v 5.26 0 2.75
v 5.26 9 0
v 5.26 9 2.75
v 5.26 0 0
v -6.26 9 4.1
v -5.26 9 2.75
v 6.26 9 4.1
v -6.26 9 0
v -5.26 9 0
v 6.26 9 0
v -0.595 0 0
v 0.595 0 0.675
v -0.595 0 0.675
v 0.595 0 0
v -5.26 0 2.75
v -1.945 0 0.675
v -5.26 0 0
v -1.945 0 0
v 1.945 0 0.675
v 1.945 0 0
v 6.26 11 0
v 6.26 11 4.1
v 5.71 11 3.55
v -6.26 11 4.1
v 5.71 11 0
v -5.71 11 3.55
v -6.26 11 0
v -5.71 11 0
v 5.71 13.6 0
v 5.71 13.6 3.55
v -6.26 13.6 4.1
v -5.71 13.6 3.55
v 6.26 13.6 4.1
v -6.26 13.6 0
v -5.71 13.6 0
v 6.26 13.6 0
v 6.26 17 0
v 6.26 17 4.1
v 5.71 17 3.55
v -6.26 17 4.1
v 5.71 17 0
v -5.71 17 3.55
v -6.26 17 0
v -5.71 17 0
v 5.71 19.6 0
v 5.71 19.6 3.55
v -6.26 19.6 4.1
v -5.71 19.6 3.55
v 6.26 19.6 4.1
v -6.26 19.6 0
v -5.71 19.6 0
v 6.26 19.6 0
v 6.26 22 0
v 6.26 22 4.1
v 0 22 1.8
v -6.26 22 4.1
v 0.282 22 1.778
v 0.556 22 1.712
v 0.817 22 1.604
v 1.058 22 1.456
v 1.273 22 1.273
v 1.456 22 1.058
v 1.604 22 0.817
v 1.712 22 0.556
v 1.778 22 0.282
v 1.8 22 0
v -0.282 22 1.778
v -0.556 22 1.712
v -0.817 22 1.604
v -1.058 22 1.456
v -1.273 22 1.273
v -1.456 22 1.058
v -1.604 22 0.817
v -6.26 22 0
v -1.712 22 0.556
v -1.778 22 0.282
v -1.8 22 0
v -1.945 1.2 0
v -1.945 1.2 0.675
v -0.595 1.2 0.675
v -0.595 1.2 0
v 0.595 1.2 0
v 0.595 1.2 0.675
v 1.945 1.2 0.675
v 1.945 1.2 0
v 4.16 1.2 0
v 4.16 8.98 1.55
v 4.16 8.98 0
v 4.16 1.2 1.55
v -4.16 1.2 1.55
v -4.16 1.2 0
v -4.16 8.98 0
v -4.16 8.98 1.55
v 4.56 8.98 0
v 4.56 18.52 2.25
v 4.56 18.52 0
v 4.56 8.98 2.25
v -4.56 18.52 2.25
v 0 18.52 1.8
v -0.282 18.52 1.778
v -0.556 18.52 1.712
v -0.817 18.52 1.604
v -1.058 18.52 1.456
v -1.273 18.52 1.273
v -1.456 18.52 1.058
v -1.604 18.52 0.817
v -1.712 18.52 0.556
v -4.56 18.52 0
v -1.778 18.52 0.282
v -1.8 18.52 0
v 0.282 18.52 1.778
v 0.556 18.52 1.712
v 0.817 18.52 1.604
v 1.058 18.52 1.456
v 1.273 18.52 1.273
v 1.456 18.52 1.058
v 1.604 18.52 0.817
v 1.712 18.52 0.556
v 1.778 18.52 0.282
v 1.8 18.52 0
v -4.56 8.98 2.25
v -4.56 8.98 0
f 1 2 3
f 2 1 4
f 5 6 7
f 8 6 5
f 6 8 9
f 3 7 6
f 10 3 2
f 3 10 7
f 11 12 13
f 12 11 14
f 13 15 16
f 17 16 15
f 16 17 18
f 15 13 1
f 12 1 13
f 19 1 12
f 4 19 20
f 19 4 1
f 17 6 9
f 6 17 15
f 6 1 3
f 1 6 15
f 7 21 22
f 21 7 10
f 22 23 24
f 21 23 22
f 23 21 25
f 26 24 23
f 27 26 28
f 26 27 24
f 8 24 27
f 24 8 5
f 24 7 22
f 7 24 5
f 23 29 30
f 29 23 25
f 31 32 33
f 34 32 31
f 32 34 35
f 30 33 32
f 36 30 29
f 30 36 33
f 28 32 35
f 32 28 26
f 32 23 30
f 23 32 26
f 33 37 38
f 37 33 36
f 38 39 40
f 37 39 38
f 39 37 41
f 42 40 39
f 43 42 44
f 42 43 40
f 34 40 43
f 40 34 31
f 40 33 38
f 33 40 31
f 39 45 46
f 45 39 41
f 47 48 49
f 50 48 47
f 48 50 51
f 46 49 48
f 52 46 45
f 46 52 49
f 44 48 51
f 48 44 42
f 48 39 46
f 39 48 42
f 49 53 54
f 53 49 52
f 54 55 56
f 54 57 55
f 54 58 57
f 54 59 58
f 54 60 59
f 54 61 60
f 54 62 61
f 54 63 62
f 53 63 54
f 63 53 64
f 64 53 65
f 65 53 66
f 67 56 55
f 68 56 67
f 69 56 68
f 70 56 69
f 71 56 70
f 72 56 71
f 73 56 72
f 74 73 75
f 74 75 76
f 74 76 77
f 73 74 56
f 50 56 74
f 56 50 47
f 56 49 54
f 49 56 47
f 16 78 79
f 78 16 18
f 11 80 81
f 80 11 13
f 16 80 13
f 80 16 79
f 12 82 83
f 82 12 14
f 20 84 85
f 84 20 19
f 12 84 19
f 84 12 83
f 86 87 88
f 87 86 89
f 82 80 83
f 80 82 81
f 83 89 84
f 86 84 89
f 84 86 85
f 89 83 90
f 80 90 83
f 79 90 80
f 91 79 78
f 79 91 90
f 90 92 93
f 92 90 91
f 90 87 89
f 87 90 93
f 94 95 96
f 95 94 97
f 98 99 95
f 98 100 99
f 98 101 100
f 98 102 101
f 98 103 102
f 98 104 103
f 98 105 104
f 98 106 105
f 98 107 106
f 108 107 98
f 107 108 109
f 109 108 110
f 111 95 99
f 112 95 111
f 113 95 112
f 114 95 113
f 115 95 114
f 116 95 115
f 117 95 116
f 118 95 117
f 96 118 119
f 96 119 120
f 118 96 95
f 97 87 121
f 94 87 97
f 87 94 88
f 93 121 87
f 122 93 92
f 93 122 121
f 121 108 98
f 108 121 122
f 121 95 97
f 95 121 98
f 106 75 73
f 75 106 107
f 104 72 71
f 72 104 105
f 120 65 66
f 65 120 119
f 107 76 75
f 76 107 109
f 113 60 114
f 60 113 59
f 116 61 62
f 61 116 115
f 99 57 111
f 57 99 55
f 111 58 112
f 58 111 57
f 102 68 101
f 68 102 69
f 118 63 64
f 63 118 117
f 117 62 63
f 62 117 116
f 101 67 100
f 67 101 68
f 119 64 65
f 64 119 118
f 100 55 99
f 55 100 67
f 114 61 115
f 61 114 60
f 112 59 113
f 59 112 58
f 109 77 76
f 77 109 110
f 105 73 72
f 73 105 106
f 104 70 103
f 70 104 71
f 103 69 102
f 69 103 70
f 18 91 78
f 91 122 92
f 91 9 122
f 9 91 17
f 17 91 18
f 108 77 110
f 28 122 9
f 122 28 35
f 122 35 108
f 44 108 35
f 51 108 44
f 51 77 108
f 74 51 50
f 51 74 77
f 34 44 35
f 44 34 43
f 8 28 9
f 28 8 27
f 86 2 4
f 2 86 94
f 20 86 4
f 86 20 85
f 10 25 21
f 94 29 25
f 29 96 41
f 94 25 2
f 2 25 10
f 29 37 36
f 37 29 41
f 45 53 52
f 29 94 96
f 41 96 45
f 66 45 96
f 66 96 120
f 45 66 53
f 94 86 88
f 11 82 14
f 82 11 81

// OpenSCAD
// Keyed, separated 2-pin and 3-pin logic connectors for the perfboard end.
// First FIT PROTOTYPE ONLY. All dimensions are millimetres.
//
// The cable plug traps a cut 1xN PCB female header between two printed halves.
// Two small cable ties around the rear grooves keep the halves together.
// A matching shroud must be fixed around the male header on the perfboard;
// the key cannot prevent reverse/cross mating against bare male pins.

$fn = 40;

contacts = 2; // [2,3]
part = "plug_lower"; // [plug_lower,plug_upper,board_shroud,exploded]

pitch = 2.54;
pin_hole = 1.35;
front_lip = 1.20;

// Female-header plastic dimensions are unmeasured. 2.84 mm extra length
// extrapolates from the approximate 13 mm overall 2x4 body already provided.
// Alter these after a physical trial with the actual 1x2 and 1x3 strips.
header_x = contacts*pitch + 2.84;
header_y = 2.70;
header_z = 8.50;
header_fit = 0.40;       // total clearance, not per side

nose_x = header_x + header_fit + 2.20;
nose_y = header_y + header_fit + 2.40;
nose_z = 9.00;

rear_x = nose_x + 2.00;
rear_y = 8.20;
rear_z = 13.00;
total_z = nose_z + rear_z;

solder_x = header_x + header_fit + 0.80;
solder_y = 4.50;
solder_z = 9.50;
cable_exit_d = contacts == 2 ? 3.60 : 4.40;

tie_groove_depth = 0.55;
tie_groove_width = 2.60;
tie_z_positions = [nose_z + 2.00, nose_z + 8.00];

key_width = 1.45;
key_projection = 1.10;
key_x = contacts == 2 ? 0 : pitch;
key_side = contacts == 2 ? 1 : -1;

shroud_clearance = 0.55;
shroud_wall = 2.00;
shroud_h = 7.50;

epsilon = 0.02;

module pin_pattern(h) {
    for (i = [0:contacts-1])
        translate([(i - (contacts-1)/2)*pitch, 0, -epsilon])
            linear_extrude(height=h + 2*epsilon)
                square([pin_hole, pin_hole], center=true);
}

module key_rib() {
    translate([key_x - key_width/2,
               key_side > 0 ? nose_y/2 : -nose_y/2 - key_projection,
               0])
        cube([key_width, key_projection, nose_z]);
}

module rear_segment(z0, zlen, recessed=false) {
    depth = recessed ? tie_groove_depth : 0;
    translate([-rear_x/2 + depth, -rear_y/2 + depth, z0])
        cube([rear_x - 2*depth, rear_y - 2*depth, zlen]);
}

module outer_plug() {
    union() {
        translate([-nose_x/2, -nose_y/2, 0])
            cube([nose_x, nose_y, nose_z]);
        key_rib();

        rear_segment(nose_z, 2.00);
        rear_segment(tie_z_positions[0], tie_groove_width, true);
        rear_segment(tie_z_positions[0] + tie_groove_width, 3.40);
        rear_segment(tie_z_positions[1], tie_groove_width, true);
        rear_segment(tie_z_positions[1] + tie_groove_width,
                     rear_z - 8.00 - tie_groove_width);
    }
}

module whole_plug() {
    difference() {
        outer_plug();
        // Header body stops against the front lip; the rear chamber provides
        // space for insulated solder tails and a small cable-stop tie.
        translate([-(header_x + header_fit)/2,
                   -(header_y + header_fit)/2, front_lip])
            cube([header_x + header_fit,
                  header_y + header_fit,
                  header_z + 0.80]);
        translate([-solder_x/2, -solder_y/2, nose_z - epsilon])
            cube([solder_x, solder_y, solder_z + 2*epsilon]);
        translate([0, 0, nose_z + solder_z - epsilon])
            cylinder(d=cable_exit_d,
                     h=rear_z - solder_z + 2*epsilon);
        pin_pattern(front_lip);
    }
}

module lower_half() {
    intersection() {
        whole_plug();
        translate([-rear_x, -rear_y, -epsilon])
            cube([2*rear_x, rear_y, total_z + 2*epsilon]);
    }
}

module upper_half() {
    intersection() {
        whole_plug();
        translate([-rear_x, 0, -epsilon])
            cube([2*rear_x, rear_y, total_z + 2*epsilon]);
    }
}

module keyed_opening(h) {
    inner_x = nose_x + shroud_clearance;
    inner_y = nose_y + shroud_clearance;
    // Main nose passage.
    translate([-inner_x/2, -inner_y/2, -epsilon])
        cube([inner_x, inner_y, h + 2*epsilon]);
    // Variant-specific keyway. 2-pin: centred on +y. 3-pin: offset on -y.
    slot_w = key_width + shroud_clearance;
    translate([key_x - slot_w/2,
               key_side > 0 ? nose_y/2 : -nose_y/2 - key_projection
                                            - shroud_clearance/2,
               -epsilon])
        cube([slot_w, key_projection + shroud_clearance/2,
              h + 2*epsilon]);
}

module board_shroud() {
    outer_x = nose_x + shroud_clearance + 2*shroud_wall;
    outer_y = nose_y + shroud_clearance + 2*shroud_wall;
    difference() {
        translate([-outer_x/2, -outer_y/2, 0])
            cube([outer_x, outer_y, shroud_h]);
        keyed_opening(shroud_h);
    }
}

if (part == "plug_lower") rotate([-90, 0, 0]) lower_half();
else if (part == "plug_upper") rotate([90, 0, 0]) upper_half();
else if (part == "board_shroud") board_shroud();
else if (part == "exploded") {
    color([0.30, 0.75, 0.85]) translate([0, 5.0, 12]) upper_half();
    color([0.40, 0.70, 0.45]) translate([0, -5.0, 12]) lower_half();
    color([0.9, 0.55, 0.25]) board_shroud();
    %translate([-header_x/2, -header_y/2, 12 + front_lip])
        cube([header_x, header_y, header_z]);
} else assert(false, str("Unknown part: ", part));
